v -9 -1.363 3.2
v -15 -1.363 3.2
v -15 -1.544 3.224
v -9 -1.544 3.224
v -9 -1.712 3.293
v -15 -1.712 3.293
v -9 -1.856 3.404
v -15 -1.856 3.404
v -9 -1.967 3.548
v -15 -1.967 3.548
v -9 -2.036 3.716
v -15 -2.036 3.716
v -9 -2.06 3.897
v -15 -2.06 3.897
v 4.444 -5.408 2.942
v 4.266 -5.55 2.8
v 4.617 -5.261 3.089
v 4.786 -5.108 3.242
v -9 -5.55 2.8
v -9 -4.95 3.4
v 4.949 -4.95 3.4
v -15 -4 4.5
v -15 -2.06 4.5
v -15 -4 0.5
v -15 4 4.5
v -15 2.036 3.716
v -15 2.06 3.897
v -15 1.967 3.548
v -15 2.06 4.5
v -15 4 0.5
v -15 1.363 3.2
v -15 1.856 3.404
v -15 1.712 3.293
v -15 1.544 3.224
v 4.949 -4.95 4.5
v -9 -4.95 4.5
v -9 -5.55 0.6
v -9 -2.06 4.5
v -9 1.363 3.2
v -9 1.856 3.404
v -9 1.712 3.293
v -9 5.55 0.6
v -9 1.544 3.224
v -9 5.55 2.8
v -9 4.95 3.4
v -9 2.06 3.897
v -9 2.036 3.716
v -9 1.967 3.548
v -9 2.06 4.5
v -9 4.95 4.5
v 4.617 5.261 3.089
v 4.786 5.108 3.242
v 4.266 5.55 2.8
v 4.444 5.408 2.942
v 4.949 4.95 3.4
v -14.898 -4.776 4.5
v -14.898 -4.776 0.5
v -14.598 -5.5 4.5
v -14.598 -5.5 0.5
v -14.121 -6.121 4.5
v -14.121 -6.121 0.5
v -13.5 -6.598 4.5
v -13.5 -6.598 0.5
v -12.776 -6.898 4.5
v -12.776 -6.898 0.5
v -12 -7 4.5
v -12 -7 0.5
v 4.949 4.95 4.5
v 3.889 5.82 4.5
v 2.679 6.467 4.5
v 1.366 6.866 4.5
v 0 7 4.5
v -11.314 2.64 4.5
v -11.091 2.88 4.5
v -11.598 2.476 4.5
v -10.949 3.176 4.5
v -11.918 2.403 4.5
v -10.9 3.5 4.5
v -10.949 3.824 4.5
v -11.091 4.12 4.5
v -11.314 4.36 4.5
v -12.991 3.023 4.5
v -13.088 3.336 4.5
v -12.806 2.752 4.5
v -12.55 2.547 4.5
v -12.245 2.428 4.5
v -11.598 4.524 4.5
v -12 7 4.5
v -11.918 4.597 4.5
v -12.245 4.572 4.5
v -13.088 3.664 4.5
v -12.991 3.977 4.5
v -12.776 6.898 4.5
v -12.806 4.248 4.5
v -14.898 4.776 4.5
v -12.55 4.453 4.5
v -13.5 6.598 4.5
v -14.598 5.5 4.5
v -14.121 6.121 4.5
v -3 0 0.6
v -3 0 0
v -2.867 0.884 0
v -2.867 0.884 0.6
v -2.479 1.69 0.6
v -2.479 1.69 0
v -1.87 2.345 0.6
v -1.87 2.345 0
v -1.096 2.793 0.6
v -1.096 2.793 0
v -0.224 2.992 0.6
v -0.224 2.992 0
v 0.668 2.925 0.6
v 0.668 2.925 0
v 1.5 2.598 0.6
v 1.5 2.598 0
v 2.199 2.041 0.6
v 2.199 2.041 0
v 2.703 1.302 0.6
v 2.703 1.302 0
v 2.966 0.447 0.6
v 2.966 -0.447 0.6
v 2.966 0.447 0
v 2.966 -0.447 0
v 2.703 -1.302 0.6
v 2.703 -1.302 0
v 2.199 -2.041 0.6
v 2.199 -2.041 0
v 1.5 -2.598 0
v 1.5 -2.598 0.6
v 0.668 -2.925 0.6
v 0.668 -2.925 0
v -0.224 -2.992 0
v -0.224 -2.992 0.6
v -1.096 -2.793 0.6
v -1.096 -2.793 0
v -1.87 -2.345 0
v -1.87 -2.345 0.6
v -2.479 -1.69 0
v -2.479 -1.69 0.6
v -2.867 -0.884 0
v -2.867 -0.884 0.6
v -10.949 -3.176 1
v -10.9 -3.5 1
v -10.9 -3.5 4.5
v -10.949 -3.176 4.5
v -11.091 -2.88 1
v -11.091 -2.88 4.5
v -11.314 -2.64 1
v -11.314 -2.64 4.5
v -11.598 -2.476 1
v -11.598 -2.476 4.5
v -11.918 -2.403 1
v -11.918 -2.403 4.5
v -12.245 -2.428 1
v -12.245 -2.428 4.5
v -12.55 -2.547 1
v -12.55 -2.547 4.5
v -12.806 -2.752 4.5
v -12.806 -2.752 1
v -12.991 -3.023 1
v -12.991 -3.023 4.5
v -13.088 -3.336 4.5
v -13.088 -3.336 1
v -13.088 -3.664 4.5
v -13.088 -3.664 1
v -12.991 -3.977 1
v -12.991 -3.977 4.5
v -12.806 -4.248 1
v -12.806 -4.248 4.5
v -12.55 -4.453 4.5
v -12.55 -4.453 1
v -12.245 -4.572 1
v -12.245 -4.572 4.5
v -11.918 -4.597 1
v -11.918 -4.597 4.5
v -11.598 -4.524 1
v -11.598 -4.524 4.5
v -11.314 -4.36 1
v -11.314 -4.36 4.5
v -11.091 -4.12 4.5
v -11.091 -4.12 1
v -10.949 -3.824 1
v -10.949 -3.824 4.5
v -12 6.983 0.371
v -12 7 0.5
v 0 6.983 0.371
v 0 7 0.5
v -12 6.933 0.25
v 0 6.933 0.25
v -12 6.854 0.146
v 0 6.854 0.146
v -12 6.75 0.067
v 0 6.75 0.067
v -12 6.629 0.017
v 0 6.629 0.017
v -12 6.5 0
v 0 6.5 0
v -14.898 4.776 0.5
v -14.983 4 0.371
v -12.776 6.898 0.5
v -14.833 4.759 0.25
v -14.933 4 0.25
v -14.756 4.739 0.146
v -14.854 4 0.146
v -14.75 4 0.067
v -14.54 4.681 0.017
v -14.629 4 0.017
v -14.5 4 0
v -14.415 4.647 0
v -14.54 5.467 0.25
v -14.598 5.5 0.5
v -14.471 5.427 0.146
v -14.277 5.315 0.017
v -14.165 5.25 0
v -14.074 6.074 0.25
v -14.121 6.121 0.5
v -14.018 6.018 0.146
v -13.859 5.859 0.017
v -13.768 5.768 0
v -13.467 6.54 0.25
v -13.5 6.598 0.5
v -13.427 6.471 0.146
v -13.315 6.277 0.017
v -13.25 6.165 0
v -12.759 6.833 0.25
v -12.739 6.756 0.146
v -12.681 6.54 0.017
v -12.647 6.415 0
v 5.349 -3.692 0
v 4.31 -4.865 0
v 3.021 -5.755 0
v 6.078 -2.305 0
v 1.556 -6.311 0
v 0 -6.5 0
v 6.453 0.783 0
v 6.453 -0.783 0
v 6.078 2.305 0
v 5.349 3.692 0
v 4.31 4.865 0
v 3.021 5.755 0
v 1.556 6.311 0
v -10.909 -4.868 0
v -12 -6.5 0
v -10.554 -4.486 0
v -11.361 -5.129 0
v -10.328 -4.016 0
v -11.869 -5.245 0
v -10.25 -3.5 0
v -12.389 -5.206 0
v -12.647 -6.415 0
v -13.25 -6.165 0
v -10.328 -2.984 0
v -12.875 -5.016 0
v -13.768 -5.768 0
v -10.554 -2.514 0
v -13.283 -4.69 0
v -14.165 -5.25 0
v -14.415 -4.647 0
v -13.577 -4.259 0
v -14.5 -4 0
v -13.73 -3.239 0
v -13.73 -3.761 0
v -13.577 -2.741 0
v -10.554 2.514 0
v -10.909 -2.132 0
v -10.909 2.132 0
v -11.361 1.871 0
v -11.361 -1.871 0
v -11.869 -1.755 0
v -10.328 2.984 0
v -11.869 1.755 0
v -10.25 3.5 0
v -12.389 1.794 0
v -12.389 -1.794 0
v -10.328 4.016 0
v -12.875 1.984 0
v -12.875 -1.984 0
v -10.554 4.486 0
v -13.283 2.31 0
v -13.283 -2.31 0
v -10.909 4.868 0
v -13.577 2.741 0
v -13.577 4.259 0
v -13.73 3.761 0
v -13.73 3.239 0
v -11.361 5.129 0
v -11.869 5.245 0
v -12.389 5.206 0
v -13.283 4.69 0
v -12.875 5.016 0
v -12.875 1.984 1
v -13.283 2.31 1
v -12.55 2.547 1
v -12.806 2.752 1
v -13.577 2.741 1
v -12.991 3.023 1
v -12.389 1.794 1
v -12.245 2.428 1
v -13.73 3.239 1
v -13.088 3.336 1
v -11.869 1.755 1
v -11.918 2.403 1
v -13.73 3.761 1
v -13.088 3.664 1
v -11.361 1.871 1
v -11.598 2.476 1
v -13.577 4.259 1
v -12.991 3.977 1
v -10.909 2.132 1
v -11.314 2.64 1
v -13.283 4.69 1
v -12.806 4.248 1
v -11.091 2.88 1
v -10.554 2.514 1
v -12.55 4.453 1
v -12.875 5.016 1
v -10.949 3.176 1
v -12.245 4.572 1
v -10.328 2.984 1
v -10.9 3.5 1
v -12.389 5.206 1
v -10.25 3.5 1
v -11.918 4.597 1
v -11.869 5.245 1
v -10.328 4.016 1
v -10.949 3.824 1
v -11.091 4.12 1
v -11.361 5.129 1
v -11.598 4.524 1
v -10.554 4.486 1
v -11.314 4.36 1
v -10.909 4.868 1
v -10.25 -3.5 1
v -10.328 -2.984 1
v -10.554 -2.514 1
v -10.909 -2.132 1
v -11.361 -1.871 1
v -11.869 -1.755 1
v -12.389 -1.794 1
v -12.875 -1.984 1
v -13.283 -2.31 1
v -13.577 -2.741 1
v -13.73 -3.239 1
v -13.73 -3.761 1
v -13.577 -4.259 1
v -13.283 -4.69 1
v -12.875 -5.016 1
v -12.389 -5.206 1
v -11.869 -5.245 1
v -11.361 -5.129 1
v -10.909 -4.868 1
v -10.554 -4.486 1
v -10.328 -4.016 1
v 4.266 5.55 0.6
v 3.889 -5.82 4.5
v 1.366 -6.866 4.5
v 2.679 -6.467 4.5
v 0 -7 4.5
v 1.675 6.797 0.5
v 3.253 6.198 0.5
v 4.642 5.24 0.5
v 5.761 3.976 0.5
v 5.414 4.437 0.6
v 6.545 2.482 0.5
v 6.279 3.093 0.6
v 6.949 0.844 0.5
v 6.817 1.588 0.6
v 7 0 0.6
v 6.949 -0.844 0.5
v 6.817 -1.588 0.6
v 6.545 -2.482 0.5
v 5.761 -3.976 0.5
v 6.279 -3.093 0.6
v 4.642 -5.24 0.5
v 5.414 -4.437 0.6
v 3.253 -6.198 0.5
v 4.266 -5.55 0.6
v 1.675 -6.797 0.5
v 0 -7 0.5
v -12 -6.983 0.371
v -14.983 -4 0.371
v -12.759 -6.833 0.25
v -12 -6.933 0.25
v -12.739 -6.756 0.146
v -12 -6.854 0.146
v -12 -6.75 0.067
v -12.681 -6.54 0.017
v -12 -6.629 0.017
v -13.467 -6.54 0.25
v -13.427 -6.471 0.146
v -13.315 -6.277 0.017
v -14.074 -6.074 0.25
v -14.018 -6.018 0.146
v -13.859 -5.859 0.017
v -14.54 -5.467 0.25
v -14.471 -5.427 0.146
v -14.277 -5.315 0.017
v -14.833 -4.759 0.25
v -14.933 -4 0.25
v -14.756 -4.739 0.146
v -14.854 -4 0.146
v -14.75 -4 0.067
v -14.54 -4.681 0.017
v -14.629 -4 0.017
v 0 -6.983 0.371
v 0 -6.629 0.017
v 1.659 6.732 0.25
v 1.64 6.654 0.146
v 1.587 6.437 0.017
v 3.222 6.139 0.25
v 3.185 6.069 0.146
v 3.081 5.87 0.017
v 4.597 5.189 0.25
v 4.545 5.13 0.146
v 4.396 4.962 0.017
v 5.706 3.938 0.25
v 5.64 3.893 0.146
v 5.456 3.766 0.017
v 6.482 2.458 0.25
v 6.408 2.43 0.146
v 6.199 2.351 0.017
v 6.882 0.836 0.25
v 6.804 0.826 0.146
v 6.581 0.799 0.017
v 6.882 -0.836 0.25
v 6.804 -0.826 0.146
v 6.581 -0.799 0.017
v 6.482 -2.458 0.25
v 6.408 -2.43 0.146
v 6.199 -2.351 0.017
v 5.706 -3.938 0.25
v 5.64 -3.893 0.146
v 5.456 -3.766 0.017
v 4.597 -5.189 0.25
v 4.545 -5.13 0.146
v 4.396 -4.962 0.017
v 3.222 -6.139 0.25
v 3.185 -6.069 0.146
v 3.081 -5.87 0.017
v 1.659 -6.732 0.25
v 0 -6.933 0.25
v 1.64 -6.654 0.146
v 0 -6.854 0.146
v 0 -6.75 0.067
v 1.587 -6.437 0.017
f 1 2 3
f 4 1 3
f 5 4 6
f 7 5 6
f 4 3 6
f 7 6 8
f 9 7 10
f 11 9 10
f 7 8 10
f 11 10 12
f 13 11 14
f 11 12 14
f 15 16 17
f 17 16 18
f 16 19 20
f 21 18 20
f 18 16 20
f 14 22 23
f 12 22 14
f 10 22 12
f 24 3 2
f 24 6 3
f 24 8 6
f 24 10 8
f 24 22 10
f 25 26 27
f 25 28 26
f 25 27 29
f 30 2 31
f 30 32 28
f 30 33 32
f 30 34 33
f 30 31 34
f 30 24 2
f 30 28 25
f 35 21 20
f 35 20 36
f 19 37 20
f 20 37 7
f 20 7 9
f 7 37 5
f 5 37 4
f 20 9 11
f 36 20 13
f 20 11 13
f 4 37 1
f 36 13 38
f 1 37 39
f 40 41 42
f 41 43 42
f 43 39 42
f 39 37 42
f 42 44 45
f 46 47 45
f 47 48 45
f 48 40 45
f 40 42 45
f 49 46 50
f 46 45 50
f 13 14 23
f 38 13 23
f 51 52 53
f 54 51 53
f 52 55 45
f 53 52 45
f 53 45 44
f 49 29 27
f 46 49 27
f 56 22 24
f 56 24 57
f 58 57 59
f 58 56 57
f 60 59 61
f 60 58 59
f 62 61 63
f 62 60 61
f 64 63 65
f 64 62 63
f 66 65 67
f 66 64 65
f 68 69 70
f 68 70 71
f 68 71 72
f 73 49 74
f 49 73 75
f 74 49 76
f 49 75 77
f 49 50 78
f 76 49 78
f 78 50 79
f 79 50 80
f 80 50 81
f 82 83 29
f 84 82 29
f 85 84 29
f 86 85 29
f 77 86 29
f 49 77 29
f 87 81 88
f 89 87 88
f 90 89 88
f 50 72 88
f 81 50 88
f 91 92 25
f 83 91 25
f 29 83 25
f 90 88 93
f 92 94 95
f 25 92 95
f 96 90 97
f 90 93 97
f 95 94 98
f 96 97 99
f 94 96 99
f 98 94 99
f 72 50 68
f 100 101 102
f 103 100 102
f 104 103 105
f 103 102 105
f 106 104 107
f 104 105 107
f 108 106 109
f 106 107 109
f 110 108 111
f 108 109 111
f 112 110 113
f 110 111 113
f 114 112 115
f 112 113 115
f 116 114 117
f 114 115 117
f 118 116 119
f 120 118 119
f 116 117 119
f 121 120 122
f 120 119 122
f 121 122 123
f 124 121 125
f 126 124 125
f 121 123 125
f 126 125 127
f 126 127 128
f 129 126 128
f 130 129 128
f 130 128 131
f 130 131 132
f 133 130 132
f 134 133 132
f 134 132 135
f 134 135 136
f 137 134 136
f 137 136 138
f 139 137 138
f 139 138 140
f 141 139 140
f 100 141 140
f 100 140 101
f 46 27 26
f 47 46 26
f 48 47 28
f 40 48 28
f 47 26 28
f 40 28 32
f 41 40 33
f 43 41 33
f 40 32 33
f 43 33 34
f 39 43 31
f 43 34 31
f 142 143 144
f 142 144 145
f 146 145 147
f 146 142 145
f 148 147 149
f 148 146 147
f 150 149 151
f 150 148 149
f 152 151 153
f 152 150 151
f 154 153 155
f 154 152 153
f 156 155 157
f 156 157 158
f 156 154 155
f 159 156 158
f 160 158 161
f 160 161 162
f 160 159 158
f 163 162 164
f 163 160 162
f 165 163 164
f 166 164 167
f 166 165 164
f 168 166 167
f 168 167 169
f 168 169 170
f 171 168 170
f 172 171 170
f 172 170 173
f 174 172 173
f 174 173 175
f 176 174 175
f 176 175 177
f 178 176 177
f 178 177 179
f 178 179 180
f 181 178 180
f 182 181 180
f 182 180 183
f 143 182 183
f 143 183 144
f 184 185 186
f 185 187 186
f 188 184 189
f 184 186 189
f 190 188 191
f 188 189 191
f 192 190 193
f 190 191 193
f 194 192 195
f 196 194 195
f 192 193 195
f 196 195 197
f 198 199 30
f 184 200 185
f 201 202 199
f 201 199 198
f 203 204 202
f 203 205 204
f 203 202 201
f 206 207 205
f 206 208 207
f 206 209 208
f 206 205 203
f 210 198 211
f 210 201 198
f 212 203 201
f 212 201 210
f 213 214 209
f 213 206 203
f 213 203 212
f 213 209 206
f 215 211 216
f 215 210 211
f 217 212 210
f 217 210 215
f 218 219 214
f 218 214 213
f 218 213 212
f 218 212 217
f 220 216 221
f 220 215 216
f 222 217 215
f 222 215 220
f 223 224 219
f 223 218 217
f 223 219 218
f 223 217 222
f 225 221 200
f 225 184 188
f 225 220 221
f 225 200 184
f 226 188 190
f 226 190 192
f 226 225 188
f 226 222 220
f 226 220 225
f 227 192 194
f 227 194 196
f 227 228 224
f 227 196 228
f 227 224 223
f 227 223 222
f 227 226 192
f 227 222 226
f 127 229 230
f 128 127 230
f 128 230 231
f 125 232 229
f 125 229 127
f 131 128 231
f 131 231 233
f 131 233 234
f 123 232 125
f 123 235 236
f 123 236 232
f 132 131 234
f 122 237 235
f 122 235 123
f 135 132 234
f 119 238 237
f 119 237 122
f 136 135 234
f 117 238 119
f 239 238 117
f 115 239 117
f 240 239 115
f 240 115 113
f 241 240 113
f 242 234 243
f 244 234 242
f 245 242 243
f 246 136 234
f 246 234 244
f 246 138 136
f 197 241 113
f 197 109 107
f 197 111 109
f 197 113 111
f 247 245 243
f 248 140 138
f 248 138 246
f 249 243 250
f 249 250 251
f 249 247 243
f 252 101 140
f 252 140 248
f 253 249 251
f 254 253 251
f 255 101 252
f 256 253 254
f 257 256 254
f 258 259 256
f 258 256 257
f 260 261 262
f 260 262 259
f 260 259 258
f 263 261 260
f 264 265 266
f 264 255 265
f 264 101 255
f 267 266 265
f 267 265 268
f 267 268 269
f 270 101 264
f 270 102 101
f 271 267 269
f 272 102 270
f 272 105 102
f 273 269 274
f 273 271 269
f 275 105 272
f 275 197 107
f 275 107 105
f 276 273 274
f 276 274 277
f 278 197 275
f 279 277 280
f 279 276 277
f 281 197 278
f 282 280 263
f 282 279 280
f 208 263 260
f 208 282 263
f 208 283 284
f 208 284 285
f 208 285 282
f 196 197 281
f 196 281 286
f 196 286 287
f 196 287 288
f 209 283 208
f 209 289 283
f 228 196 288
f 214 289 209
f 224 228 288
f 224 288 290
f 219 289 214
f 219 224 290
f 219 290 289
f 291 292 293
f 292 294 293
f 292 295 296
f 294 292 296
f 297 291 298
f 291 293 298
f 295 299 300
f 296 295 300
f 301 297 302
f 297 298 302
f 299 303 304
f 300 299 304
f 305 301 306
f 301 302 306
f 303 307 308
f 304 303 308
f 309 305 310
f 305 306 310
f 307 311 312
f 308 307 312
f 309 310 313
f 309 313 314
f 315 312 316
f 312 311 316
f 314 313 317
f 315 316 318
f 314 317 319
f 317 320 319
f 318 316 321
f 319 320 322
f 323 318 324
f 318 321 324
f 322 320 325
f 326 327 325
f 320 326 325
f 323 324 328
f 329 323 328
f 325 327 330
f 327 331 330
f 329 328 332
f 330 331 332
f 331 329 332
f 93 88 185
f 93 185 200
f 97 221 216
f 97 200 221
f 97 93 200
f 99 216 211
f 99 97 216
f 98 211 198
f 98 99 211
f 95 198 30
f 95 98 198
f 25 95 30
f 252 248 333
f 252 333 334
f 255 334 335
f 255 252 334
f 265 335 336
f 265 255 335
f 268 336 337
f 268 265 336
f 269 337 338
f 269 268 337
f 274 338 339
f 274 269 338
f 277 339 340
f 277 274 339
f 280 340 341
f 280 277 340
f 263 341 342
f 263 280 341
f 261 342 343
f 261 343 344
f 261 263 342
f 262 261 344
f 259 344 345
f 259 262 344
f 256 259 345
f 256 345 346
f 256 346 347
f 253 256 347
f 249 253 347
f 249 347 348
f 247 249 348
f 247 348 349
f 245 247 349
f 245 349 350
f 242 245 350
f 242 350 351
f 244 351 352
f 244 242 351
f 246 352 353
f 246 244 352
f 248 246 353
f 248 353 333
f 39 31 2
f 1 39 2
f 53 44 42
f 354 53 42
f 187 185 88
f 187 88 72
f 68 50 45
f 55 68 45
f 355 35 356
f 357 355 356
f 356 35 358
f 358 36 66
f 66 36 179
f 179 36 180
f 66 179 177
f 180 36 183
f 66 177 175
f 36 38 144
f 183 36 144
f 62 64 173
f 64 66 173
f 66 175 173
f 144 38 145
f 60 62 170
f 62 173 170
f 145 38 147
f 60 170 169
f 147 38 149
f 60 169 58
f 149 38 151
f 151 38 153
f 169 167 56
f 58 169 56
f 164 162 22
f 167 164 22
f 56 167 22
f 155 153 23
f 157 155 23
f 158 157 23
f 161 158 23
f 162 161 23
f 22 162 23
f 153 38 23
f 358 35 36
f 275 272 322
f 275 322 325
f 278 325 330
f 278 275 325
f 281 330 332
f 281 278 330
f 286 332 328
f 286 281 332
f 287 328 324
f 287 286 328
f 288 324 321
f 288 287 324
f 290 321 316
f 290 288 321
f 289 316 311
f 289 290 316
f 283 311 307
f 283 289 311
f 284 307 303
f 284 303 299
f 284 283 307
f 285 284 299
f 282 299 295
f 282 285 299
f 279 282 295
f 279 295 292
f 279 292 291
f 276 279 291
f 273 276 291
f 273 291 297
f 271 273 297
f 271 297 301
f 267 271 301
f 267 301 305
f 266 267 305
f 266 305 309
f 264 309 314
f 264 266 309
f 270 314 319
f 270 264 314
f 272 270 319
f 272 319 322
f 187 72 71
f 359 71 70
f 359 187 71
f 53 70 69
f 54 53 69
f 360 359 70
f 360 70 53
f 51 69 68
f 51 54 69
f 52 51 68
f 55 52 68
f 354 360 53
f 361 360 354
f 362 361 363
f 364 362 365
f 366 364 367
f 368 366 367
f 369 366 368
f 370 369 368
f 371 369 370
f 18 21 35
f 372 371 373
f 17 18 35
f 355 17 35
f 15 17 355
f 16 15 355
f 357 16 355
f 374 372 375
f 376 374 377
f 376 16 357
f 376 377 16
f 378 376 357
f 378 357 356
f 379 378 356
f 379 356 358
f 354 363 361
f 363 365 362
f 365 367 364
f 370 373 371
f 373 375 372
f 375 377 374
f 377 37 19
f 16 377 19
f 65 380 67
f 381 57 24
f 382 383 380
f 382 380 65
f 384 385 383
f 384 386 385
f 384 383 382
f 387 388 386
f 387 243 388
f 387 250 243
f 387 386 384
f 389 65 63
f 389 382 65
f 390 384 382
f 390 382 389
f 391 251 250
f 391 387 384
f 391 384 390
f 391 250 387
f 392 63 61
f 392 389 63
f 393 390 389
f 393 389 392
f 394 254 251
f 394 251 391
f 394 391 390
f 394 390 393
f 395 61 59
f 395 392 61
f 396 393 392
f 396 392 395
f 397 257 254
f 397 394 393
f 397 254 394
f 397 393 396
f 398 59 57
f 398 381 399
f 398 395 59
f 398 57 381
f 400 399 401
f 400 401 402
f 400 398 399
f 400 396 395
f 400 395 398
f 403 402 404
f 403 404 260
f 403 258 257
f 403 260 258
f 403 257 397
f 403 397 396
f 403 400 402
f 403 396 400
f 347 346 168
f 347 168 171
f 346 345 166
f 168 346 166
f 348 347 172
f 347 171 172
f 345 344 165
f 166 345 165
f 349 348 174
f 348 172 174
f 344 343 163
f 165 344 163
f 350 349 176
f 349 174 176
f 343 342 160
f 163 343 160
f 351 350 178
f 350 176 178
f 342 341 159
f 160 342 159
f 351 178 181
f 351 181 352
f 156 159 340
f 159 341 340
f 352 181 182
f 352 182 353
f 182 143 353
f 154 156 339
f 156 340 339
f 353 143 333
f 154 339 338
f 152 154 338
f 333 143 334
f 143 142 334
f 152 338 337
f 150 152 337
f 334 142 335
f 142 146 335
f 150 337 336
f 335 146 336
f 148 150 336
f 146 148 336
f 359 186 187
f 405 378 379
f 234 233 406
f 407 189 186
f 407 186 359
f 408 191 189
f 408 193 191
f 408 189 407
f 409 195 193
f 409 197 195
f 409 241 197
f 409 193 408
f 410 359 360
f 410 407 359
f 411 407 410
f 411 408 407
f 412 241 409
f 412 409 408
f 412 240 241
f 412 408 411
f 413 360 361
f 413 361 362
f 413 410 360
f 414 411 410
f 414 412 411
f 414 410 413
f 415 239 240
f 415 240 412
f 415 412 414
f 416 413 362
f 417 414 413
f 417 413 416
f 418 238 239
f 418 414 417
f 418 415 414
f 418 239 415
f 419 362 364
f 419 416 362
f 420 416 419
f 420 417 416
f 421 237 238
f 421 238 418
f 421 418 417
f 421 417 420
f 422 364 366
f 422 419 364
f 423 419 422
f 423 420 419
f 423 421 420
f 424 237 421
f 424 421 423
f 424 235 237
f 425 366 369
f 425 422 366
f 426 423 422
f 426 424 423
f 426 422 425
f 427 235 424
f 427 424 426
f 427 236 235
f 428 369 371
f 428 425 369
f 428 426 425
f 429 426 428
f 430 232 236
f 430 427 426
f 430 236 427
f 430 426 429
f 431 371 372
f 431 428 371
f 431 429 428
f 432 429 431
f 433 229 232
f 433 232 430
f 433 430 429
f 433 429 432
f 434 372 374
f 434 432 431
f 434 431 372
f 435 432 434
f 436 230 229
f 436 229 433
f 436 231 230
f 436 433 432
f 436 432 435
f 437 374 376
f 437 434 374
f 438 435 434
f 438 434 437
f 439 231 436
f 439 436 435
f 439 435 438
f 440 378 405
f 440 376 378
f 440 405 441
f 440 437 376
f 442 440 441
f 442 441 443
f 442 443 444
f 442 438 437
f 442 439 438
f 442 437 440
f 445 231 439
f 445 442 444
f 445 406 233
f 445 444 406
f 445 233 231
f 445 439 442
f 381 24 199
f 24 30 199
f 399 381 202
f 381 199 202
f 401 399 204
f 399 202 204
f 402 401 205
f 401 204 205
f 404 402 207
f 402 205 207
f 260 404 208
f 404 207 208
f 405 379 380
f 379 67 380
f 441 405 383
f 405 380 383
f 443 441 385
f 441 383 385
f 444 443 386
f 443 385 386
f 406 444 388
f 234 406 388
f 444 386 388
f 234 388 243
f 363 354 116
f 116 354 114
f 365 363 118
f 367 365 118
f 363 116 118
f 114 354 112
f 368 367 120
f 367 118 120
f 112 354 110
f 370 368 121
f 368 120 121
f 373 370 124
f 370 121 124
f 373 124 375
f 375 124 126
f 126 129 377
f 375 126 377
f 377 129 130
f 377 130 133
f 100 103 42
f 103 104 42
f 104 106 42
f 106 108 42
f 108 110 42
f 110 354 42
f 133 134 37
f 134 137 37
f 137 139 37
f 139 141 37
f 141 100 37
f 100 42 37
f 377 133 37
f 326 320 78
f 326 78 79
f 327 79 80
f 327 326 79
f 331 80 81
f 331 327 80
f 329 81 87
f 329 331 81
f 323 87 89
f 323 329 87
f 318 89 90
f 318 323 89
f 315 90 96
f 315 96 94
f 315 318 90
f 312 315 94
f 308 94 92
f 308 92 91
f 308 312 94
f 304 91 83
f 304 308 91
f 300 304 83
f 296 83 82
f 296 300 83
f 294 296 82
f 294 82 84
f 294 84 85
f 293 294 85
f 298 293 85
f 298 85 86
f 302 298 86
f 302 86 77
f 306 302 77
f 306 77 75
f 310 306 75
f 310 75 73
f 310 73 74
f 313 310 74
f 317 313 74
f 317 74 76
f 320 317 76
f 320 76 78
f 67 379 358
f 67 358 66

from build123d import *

# Parameters (mm, degrees)
SKETCH1_R           = 1.1
BOSS_EXTRUDE1_DEPTH = 4.5
SKETCH2_R           = 3
CUT_EXTRUDE2_DEPTH  = 10
CUT_EXTRUDE4_START  = -6
CUT_EXTRUDE4_DEPTH  = 17
CUT_EXTRUDE6_DEPTH  = 23
FILLET4_R           = 3
FILLET1_R           = 0.5
SKETCH5_R           = 1.75
CUT_EXTRUDE5_DEPTH  = 1


with BuildPart() as part:
    # Sketch1 → Boss-Extrude1 (new body)
    with BuildSketch(Plane.XY):
        with BuildLine():
            Line((-15, 7), (0, 7))
            ThreePointArc((0, 7), (7, 0), (0, -7))
            Line((0, -7), (-15, -7))
            Line((-15, -7), (-15, 7))
        make_face()
        with Locations((-12, 3.5)):
            Circle(SKETCH1_R, mode=Mode.SUBTRACT)
        with Locations((-12, -3.5)):
            Circle(SKETCH1_R, mode=Mode.SUBTRACT)
    extrude(amount=BOSS_EXTRUDE1_DEPTH)

    # Sketch2 → Cut-Extrude2 (cut)
    with BuildSketch(Plane(origin=(0, 0, 0), x_dir=(-1, 0, 0), z_dir=(0, 0, -1))):
        Circle(SKETCH2_R)
    extrude(amount=-CUT_EXTRUDE2_DEPTH, mode=Mode.SUBTRACT)

    # Sketch7 → Cut-Extrude4 (cut, through all)
    with BuildSketch(Plane.ZY.offset(15).offset(CUT_EXTRUDE4_START)):
        Polygon((2.8, 5.55), (0.6, 5.55), (0.6, 0), (4.5, 0), (4.5, 4.95), (3.4, 4.95), align=None)
        Polygon((4.5, 0), (0.6, 0), (0.6, -5.55), (2.8, -5.55), (3.4, -4.95), (4.5, -4.95), align=None)
    extrude(amount=-CUT_EXTRUDE4_DEPTH, mode=Mode.SUBTRACT)

    # Sketch8 → Cut-Extrude6 (cut, through all)
    with BuildSketch(Plane.ZY.offset(15)):
        with BuildLine():
            Line((3.2, 1.363340016), (3.2, -1.363340016))
            ThreePointArc((3.2, -1.363340016), (3.404046985, -1.855953015), (3.896659984, -2.06))
            Line((3.896659984, -2.06), (4.5, -2.06))
            Line((4.5, -2.06), (4.5, 2.06))
            Line((4.5, 2.06), (3.896659984, 2.06))
            ThreePointArc((3.896659984, 2.06), (3.404046985, 1.855953015), (3.2, 1.363340016))
        make_face()
    extrude(amount=-CUT_EXTRUDE6_DEPTH, mode=Mode.SUBTRACT)

    # Fillet4
    fillet4_edges = [part.edges().sort_by_distance(p)[0] for p in [
        (-15, -7, 2.25),
        (-15, 7, 2.25),
    ]]
    fillet(fillet4_edges, radius=FILLET4_R)

    # Fillet1
    fillet1_edges = [part.edges().sort_by_distance(p)[0] for p in [
        (-6, 7, 0),
        (7, 0, 0),
        (-15, 0, 0),
        (-6, -7, 0),
        (-14.121320344, -6.121320344, 0),
        (-14.121320344, 6.121320344, 0),
    ]]
    fillet(fillet1_edges, radius=FILLET1_R)

    # Sketch5 → Cut-Extrude5 (cut)
    with BuildSketch(Plane.XY):
        with Locations((-12, 3.5)):
            Circle(SKETCH5_R)
        with Locations((-12, -3.5)):
            Circle(SKETCH5_R)
    extrude(amount=CUT_EXTRUDE5_DEPTH, mode=Mode.SUBTRACT)


solid = part.part
